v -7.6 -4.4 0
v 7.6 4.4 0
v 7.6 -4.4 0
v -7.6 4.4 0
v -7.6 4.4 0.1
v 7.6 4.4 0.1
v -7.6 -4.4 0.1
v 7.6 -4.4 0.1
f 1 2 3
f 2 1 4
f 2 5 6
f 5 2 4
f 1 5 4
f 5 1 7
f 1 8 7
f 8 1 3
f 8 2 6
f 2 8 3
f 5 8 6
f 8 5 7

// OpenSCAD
// file: ../p/box5-12.scad
use <../lib.scad>
function ldraw_lib__box5_12() = [
// 0 Box with 5 Faces without Any Edges
// 0 Name: box5-12.dat
// 0 Author: Chris Dee [cwdee]
// 0 !LDRAW_ORG Primitive UPDATE 2009-02
// 0 !LICENSE Licensed under CC BY 4.0 : see CAreadme.txt
// 
// 0 BFC CERTIFY CCW
  [0,"BFC","CERTIFY"],
  [0,"BFC","CCW"],
// 
// 0 !HISTORY 2009-09-03 [PTadmin] Official Update 2009-02
// 
// 
// 4 16 1 1 1 1 1 -1 -1 1 -1 -1 1 1
  [4,16,1,1,1,1,1,-1,-1,1,-1,-1,1,1],
// 4 16 -1 0 1 1 0 1 1 1 1 -1 1 1
  [4,16,-1,0,1,1,0,1,1,1,1,-1,1,1],
// 4 16 -1 0 -1 -1 0 1 -1 1 1 -1 1 -1
  [4,16,-1,0,-1,-1,0,1,-1,1,1,-1,1,-1],
// 4 16 1 0 -1 -1 0 -1 -1 1 -1 1 1 -1
  [4,16,1,0,-1,-1,0,-1,-1,1,-1,1,1,-1],
// 4 16 1 0 1 1 0 -1 1 1 -1 1 1 1
  [4,16,1,0,1,1,0,-1,1,1,-1,1,1,1],
// 0
];
module ldraw_lib__box5_12(step=0, col=false, unit=2/5, alt=false, line=0.2, solid=!$preview)
    makepoly(ldraw_lib__box5_12(), step=step, col=col, unit=unit, alt=alt, line=line, solid=solid);
ldraw_lib__box5_12(line=0.2);
// file: 162275g.scad
use <../lib.scad>
use <../p/box5-12.scad>
function ldraw_lib__162275g() = [
// 0 Sticker  1.1 x  1.9 with White Rectangle
// 0 Name: 162275g.dat
// 0 Author: Takeshi Takahashi [RainbowDolphin]
// 0 !LDRAW_ORG Part UPDATE 2023-03
// 0 !LICENSE Licensed under CC BY 4.0 : see CAreadme.txt
// 
// 0 BFC CERTIFY CCW
  [0,"BFC","CERTIFY"],
  [0,"BFC","CCW"],
// 
// 0 !KEYWORDS Bricklink 5550stk01, Brickowl 321461, Custom Rally Van, Model Team
// 0 !KEYWORDS Rebrickable 162275, Set 5550, truck
// 
// 0 !HISTORY 2023-06-24 [OrionP] Official Update 2023-03
// 
// 
// 1 16 0 -0.25 0 19 0 0 0 0.25 0 0 0 11 box5-12.dat
  [1,16,0,-0.25,0,19,0,0,0,0.25,0,0,0,11, ldraw_lib__box5_12()],
// 0 BFC NOCLIP
  [0,"BFC","NOCLIP"],
// 4 15 19 -0.25 11 -19 -0.25 11 -19 -0.25 -11 19 -0.25 -11
  [4,15,19,-0.25,11,-19,-0.25,11,-19,-0.25,-11,19,-0.25,-11],
];
module ldraw_lib__162275g(step=0, col=false, unit=2/5, alt=false, line=0.2, solid=!$preview)
    makepoly(ldraw_lib__162275g(), step=step, col=col, unit=unit, alt=alt, line=line, solid=solid);
ldraw_lib__162275g(line=0.2);
// main file
use <../lib.scad>
use <162275g.scad>
function ldraw_lib__821437b() = [
// 0 =Sticker  1.1 x  1.9 with White Rectangle
// 0 Name: 821437b.dat
// 0 Author: Chris Böhnke [KnightOfTarenta]
// 0 !LDRAW_ORG Part Alias UPDATE 2026-05
// 0 !LICENSE Licensed under CC BY 4.0 : see CAreadme.txt
// 
// 0 BFC CERTIFY CCW
  [0,"BFC","CERTIFY"],
  [0,"BFC","CCW"],
// 
// 0 !KEYWORDS Bricklink 5581stk01, Brickowl 997456, Front Light, Magic Flash
// 0 !KEYWORDS Model Team, Rebrickable 821437, Set 5581, van
// 
// 0 !HISTORY 2026-05-31 [OrionP] Official Update 2026-05
// 
// 1 16 0 0 0 1 0 0 0 1 0 0 0 1 162275g.dat
  [1,16,0,0,0,1,0,0,0,1,0,0,0,1, ldraw_lib__162275g()],
];
module ldraw_lib__821437b(step=0, col=false, unit=2/5, alt=false, line=0.2, solid=!$preview)
    makepoly(ldraw_lib__821437b(), step=step, col=col, unit=unit, alt=alt, line=line, solid=solid);
ldraw_lib__821437b(line=0.2);
